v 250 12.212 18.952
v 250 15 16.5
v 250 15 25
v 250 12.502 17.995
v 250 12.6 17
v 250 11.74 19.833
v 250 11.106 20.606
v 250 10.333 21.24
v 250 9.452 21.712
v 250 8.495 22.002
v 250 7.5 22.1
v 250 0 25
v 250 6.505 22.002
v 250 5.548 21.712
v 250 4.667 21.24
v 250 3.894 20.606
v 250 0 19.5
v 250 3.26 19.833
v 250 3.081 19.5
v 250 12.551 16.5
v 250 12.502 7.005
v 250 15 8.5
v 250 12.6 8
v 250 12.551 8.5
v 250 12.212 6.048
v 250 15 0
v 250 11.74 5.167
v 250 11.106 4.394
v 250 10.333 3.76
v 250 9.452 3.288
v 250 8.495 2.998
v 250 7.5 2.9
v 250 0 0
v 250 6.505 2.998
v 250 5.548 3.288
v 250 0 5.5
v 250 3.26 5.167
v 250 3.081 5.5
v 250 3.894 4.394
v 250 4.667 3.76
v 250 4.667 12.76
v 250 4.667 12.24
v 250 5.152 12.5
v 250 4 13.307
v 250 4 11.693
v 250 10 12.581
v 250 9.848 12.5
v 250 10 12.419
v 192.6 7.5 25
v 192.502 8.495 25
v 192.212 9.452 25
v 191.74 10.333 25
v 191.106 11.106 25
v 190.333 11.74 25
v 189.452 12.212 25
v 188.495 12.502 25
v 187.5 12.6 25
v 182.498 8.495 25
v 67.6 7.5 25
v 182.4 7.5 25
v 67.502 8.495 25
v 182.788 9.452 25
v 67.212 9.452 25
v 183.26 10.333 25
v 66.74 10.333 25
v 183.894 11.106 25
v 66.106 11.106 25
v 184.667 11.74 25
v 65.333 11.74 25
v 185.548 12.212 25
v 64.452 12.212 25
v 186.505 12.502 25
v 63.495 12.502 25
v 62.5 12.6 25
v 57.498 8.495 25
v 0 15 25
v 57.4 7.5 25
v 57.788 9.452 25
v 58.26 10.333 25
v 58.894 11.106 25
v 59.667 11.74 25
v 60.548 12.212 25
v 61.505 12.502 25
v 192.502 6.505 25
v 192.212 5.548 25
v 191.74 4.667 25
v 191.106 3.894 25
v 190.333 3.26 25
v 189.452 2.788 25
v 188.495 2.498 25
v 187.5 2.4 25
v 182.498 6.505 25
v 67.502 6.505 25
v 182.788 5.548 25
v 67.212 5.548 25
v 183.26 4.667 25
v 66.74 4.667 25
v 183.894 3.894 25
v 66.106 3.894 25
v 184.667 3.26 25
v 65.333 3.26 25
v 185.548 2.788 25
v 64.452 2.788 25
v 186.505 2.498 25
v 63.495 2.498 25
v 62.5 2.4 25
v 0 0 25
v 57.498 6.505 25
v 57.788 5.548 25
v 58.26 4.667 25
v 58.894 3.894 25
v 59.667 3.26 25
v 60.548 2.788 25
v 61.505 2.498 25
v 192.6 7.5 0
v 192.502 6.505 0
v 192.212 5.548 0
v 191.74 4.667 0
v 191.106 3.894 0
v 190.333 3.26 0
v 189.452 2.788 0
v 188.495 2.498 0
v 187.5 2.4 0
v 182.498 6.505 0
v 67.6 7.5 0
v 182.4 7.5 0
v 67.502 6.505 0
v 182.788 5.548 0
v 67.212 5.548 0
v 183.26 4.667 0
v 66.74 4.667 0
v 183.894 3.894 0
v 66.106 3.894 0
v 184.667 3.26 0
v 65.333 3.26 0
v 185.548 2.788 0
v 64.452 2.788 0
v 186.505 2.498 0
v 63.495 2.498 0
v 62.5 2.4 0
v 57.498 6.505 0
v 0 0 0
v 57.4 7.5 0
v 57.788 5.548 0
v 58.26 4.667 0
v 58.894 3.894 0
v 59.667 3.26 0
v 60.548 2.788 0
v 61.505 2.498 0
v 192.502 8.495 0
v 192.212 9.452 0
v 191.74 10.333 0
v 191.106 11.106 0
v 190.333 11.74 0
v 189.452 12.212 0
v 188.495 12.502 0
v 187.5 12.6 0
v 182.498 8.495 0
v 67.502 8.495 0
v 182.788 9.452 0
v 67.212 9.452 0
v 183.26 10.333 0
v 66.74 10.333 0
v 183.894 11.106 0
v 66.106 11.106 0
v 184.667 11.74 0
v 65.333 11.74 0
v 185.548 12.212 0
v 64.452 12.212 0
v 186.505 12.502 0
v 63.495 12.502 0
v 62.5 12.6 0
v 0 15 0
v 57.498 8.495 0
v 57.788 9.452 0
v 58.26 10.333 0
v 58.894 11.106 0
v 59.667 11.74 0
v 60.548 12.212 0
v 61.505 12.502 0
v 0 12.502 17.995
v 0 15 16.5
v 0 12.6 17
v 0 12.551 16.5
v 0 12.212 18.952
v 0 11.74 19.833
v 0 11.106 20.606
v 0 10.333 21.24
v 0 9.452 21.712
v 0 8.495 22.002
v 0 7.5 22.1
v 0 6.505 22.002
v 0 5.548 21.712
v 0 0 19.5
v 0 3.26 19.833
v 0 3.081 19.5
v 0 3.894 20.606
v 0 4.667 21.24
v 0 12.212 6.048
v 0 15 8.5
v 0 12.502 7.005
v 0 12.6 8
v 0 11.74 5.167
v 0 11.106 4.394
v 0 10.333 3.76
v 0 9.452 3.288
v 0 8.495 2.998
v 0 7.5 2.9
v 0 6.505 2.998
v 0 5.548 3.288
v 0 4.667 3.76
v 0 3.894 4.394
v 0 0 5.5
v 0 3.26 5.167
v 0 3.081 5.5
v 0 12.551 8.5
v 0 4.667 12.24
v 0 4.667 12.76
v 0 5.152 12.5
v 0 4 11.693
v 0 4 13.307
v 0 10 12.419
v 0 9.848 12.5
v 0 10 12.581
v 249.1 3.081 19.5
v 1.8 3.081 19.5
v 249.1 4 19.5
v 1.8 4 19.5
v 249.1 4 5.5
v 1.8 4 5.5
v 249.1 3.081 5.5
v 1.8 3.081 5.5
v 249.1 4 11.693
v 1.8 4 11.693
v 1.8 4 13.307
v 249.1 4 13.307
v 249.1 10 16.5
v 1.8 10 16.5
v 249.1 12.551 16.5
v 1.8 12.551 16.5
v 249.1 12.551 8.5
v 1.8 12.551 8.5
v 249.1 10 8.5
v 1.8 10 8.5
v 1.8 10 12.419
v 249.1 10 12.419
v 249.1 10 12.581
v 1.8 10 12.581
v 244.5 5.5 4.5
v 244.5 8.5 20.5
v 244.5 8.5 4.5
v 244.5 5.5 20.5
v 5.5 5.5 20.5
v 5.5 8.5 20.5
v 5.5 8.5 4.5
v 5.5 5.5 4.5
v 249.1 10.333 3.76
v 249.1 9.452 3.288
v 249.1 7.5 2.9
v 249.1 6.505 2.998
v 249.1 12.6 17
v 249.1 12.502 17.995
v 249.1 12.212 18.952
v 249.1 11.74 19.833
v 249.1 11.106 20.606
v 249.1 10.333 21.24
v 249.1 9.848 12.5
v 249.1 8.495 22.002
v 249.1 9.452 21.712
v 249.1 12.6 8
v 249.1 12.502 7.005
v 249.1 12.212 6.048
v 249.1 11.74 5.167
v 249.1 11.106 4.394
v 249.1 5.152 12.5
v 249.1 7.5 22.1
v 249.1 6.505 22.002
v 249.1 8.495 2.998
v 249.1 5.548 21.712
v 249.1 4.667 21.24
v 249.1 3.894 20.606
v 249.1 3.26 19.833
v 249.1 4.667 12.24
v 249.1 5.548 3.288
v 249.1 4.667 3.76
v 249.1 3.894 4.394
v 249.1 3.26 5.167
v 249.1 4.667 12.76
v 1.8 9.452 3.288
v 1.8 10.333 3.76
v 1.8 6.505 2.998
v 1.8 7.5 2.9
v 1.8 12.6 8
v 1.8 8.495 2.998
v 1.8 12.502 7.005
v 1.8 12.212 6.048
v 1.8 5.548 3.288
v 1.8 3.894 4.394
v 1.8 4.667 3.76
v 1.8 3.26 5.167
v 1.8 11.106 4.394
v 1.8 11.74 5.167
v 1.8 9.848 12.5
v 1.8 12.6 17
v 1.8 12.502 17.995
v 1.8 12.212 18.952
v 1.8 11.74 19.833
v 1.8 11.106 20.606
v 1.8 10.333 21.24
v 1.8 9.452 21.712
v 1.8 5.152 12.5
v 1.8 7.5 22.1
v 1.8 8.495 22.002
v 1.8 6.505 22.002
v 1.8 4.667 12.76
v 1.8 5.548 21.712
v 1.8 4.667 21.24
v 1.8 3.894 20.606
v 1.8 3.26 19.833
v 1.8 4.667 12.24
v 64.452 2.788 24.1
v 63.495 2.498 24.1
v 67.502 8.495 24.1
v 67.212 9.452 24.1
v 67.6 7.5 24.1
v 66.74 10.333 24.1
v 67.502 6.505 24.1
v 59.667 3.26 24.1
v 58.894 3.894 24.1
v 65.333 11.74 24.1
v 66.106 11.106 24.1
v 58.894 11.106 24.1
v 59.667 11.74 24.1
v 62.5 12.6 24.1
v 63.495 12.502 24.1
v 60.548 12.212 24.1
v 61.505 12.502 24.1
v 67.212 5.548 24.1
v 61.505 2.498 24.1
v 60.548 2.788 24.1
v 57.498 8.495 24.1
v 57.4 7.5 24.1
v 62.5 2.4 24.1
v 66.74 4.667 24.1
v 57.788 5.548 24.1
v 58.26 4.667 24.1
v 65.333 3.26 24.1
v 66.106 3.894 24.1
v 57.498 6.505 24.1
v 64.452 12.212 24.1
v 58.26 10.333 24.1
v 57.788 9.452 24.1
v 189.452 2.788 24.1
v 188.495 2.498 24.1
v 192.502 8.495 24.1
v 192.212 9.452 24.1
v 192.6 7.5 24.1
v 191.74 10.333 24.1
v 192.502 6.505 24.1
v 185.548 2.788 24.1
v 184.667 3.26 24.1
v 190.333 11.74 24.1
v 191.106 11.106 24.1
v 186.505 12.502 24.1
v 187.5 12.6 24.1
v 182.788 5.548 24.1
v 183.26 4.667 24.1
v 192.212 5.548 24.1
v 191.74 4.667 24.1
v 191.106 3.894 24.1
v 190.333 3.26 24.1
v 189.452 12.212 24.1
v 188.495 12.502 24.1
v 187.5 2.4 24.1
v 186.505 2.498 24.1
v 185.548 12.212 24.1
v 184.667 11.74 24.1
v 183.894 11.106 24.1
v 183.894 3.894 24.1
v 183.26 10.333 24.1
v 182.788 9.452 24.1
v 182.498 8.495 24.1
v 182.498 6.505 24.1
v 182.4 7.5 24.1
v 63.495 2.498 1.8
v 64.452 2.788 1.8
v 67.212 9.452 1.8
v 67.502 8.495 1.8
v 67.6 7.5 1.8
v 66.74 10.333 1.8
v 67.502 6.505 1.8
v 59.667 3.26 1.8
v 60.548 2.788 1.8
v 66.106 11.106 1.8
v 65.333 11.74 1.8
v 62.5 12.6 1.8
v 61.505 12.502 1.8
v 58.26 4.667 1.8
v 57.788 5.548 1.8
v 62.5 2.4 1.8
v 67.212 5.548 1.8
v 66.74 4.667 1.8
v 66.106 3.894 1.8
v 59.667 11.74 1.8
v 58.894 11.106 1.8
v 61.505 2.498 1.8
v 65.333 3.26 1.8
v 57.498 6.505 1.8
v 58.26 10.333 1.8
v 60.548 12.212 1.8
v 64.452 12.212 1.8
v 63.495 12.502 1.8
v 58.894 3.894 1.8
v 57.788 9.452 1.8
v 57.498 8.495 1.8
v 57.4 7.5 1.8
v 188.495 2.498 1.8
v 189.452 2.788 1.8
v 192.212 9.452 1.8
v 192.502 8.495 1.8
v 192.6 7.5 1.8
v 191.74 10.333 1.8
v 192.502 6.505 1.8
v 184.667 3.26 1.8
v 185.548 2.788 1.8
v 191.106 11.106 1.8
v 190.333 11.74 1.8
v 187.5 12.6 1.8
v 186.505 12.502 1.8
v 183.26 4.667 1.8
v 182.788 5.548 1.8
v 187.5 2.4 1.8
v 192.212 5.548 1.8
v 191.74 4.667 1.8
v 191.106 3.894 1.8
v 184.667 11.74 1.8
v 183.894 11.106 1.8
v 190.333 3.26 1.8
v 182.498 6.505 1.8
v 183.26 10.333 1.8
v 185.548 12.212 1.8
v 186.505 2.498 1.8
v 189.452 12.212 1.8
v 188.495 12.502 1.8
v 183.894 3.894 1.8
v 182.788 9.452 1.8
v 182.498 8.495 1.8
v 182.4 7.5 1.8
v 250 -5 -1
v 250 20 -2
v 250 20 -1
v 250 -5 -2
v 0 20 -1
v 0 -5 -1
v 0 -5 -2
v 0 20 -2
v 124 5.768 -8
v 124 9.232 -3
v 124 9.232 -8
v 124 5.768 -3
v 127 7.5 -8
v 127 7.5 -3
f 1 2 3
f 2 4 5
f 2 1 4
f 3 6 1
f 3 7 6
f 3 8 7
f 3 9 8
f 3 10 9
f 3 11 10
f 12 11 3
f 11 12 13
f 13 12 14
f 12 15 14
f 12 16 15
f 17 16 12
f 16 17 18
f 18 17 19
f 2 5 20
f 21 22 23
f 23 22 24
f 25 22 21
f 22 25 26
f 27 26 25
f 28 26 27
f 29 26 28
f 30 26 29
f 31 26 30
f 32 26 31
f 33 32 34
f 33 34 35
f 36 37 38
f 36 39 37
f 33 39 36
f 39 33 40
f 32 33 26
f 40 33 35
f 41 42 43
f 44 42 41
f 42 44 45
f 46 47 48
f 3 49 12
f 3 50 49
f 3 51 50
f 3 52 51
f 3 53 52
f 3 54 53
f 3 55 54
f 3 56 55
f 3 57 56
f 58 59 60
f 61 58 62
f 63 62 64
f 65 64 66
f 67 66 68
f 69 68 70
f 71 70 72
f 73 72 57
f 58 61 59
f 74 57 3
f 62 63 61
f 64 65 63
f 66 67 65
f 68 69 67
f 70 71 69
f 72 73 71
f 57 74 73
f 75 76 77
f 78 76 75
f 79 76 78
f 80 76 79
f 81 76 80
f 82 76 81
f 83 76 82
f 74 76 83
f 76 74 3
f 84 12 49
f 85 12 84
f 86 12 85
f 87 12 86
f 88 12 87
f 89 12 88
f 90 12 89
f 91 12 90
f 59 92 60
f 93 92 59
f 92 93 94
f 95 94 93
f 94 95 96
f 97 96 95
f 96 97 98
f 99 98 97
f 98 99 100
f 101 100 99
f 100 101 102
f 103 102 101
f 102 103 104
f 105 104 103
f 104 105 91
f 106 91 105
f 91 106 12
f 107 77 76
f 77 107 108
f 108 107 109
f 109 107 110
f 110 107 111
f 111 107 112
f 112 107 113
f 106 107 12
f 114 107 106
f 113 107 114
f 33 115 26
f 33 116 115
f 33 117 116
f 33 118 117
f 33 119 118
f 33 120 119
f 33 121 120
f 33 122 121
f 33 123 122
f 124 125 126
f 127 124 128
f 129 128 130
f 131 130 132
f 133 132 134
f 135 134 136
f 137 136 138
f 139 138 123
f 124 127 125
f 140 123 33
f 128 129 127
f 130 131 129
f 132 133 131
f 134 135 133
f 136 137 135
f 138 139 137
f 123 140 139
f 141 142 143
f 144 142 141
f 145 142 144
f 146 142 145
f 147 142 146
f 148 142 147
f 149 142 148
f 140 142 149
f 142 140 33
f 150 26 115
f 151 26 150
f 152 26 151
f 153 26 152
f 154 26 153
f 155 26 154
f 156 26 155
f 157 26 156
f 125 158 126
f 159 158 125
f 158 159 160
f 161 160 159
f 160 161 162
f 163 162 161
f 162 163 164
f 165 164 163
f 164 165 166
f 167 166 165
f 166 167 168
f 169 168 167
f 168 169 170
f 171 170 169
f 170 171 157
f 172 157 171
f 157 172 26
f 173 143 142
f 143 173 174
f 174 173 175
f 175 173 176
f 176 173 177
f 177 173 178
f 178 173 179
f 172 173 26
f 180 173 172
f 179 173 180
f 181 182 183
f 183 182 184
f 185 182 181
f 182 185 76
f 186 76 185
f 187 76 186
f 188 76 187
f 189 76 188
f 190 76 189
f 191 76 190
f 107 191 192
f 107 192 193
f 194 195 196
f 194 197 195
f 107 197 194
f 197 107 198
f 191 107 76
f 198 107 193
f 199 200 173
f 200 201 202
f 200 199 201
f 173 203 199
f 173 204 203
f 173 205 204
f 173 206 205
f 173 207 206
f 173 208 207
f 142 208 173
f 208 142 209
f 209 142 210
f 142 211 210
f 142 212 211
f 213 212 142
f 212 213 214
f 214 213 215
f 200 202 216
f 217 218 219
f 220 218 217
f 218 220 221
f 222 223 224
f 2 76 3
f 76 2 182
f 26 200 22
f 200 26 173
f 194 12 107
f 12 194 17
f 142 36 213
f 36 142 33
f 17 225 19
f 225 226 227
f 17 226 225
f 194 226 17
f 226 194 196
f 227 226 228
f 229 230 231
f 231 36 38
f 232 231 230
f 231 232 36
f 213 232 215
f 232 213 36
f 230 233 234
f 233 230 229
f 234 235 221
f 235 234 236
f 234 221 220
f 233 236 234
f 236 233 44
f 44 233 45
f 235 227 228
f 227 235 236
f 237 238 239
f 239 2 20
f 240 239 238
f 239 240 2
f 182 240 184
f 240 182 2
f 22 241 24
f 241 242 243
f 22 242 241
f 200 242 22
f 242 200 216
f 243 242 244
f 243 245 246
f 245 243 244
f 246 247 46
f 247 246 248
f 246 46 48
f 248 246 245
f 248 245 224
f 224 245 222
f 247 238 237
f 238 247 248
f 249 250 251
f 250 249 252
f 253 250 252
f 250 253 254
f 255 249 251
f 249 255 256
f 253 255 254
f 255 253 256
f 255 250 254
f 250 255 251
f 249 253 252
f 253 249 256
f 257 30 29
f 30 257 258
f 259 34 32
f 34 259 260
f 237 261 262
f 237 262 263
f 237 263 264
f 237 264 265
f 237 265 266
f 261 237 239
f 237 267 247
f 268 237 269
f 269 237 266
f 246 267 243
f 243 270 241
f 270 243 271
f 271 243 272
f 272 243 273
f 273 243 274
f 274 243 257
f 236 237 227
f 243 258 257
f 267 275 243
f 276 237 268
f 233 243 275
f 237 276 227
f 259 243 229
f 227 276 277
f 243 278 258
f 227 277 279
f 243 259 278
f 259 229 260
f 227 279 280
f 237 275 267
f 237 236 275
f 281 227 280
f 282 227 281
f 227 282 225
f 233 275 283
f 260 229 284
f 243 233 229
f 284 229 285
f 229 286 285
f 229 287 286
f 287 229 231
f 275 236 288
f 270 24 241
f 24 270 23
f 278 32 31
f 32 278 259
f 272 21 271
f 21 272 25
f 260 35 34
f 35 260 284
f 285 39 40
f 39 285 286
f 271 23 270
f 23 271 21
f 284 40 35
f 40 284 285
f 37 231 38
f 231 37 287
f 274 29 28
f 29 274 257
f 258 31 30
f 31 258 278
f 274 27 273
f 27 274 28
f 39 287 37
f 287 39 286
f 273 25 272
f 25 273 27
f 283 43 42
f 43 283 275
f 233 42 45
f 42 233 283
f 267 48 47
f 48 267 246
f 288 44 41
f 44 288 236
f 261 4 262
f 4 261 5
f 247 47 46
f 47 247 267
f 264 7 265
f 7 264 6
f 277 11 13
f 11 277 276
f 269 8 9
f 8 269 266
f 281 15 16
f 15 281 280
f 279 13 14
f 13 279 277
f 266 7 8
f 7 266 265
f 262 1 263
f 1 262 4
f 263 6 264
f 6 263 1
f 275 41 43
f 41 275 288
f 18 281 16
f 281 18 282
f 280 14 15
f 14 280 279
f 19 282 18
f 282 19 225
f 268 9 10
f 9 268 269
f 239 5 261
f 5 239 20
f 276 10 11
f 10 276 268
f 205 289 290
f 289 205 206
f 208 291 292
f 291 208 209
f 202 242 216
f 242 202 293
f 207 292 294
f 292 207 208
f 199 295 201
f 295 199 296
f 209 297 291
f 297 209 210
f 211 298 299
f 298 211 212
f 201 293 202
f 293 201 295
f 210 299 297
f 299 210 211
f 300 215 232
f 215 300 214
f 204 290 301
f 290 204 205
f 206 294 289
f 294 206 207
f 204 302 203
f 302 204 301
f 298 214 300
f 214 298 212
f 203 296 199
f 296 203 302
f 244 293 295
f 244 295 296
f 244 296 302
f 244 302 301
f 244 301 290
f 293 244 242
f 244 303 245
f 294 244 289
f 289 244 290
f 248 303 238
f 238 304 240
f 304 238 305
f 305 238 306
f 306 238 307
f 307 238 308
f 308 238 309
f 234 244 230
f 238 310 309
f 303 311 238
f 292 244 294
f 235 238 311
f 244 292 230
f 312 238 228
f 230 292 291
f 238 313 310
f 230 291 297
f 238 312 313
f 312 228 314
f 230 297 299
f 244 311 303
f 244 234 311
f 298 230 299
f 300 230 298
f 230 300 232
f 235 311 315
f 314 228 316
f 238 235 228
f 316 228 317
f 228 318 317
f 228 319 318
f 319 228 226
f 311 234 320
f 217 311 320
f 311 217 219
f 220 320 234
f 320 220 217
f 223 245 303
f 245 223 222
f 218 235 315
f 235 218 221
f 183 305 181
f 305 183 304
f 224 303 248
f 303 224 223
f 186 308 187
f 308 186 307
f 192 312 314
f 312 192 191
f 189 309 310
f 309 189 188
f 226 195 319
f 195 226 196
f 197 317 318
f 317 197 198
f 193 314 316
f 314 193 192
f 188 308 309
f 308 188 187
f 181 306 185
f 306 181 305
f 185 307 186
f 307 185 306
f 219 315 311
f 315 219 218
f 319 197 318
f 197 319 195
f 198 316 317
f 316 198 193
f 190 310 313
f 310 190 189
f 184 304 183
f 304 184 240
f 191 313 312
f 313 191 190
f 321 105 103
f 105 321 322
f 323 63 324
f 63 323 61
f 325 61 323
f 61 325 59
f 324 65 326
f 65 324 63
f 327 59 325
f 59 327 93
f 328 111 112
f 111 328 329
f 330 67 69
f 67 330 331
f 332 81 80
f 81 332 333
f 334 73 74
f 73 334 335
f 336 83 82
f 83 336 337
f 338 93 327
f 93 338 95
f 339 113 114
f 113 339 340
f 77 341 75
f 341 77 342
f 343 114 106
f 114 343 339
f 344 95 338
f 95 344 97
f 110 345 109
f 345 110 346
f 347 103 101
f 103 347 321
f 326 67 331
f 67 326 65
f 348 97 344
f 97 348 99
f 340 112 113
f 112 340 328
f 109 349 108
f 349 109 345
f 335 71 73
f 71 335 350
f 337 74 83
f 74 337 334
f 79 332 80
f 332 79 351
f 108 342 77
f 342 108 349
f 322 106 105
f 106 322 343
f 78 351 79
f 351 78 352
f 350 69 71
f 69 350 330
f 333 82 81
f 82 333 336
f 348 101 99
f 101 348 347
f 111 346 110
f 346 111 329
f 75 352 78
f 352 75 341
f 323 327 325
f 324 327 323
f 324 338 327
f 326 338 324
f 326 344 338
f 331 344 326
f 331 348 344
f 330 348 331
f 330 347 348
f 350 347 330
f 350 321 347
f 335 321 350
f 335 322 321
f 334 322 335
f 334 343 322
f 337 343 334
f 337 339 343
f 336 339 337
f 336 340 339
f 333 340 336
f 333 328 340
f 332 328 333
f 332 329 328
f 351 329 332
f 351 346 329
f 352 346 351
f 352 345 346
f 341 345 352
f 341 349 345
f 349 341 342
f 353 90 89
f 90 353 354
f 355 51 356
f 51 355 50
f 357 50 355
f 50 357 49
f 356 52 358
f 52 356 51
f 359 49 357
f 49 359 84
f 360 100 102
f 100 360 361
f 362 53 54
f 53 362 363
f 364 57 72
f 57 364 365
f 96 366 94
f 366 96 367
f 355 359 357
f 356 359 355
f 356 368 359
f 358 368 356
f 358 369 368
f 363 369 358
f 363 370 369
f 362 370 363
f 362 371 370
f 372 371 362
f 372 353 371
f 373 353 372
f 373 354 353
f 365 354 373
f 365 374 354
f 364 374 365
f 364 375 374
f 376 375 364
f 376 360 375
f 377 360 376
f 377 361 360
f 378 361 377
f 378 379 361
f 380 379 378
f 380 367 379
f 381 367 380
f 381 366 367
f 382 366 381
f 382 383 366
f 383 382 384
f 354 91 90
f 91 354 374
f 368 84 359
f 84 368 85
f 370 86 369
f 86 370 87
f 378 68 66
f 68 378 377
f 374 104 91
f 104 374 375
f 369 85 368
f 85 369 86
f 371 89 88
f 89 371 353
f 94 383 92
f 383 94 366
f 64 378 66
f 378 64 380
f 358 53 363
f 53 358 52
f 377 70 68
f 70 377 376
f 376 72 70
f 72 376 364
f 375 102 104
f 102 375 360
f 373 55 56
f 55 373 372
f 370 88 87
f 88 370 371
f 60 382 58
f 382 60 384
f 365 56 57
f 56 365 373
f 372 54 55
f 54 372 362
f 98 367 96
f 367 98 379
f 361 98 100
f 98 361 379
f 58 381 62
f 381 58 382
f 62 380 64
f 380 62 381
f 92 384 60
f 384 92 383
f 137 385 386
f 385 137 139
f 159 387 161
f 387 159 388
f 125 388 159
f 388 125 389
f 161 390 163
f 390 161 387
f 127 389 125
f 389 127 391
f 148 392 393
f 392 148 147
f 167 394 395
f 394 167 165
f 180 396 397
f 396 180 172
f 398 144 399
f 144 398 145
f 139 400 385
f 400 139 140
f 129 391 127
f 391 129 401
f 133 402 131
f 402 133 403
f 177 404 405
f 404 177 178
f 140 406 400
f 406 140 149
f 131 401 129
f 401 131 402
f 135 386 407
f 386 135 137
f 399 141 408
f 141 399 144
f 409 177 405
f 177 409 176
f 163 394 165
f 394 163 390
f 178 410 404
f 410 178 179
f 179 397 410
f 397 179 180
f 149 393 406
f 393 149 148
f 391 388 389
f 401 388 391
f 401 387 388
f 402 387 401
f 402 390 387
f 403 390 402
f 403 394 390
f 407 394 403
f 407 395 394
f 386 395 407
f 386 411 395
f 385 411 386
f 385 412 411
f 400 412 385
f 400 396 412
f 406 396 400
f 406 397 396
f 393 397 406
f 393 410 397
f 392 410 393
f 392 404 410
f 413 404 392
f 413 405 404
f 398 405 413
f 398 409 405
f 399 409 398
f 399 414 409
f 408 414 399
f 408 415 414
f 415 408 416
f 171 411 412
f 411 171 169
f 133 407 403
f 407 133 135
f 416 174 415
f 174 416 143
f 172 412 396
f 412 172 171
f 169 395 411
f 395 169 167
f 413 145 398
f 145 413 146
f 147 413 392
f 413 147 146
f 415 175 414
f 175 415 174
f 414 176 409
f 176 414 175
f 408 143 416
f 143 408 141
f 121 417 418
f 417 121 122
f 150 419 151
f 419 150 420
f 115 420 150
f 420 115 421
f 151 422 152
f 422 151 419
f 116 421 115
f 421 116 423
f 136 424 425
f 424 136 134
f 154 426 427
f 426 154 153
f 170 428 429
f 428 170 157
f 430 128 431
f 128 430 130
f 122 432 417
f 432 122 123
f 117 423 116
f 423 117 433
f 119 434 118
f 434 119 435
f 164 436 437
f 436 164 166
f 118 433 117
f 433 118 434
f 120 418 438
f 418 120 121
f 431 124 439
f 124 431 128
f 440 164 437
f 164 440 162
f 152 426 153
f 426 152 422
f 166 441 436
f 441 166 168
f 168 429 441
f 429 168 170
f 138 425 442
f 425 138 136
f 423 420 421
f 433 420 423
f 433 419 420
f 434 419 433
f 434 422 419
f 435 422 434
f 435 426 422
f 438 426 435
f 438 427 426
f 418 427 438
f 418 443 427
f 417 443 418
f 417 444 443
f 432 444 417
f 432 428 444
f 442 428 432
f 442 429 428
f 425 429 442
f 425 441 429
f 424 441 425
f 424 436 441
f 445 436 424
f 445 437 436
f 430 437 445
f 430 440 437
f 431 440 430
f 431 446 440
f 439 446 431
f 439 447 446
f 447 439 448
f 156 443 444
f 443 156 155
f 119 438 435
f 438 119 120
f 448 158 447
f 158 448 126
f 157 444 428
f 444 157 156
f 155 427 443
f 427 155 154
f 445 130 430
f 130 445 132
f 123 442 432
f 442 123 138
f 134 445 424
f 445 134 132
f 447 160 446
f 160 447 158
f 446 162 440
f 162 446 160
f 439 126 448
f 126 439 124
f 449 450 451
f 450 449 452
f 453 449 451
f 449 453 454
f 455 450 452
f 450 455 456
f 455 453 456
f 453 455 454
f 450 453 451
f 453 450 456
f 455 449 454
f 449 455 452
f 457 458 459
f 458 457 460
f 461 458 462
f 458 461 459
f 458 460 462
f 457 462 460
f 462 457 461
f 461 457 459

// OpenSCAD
// file: single_module.scad
/*
 * Single LED Strip Module - Minimal Design
 * Compact holder for one section of WS2812B LED strip
 *
 * Features:
 * - Minimal size - just enough to hold the strip
 * - 4 magnet holes for modular connections
 * - Lightweight and movable
 */

// ========== CONFIGURATION ==========

// LED Strip dimensions
strip_segment_length = 250;  // Length of this module
strip_width = 12;            // WS2812B strip width

// Module dimensions (MINIMIZED)
module_width = strip_segment_length;
module_height = 25;          // 2.5cm vertical spacing (compact!)
module_depth = 15;           // Reduced from 20mm to 15mm
wall_thickness = 1.5;        // Reduced from 2mm to 1.5mm

// LED channel (on front)
led_channel_depth = 4;       // Shallow groove (reduced from 5mm)
led_channel_width = 14;      // Increased to 14mm for better fit

// Wire channel (on back)
wire_channel_width = 8;      // Narrow channel for wires
wire_channel_depth = 5;      // Back routing space

// Magnets (user's magnets: 10mm dia × 1.54mm thick)
magnet_dia = 10.2;           // 10mm + 0.2mm tolerance
magnet_thickness = 1.8;      // 1.54mm + tolerance (thin!)
magnet_inset = 8;            // Distance from edges (adjusted for 25mm height)

// ========== SINGLE MODULE ==========

module minimal_strip_holder() {
    difference() {
        // Main body - thin shell
        cube([module_width, module_depth, module_height]);

        // Front LED channel (OPEN ENDS - strip passes through)
        translate([-0.1, -0.1, module_height/2 - led_channel_width/2])
            cube([module_width + 0.2,  // Goes all the way through left to right
                  led_channel_depth + 0.1,
                  led_channel_width]);

        // Back wire channel (OPEN ENDS - wires pass through)
        translate([-0.1, module_depth - wire_channel_depth, module_height/2 - wire_channel_width/2])
            cube([module_width + 0.2,  // Goes all the way through left to right
                  wire_channel_depth + 0.1,
                  wire_channel_width]);

        // Center cavity (weight reduction)
        translate([wall_thickness + 4,
                  led_channel_depth + wall_thickness,
                  wall_thickness + 3])
            cube([module_width - 2*wall_thickness - 8,
                  module_depth - led_channel_depth - wire_channel_depth - 2*wall_thickness,
                  module_height - 2*wall_thickness - 6]);

        // HORIZONTAL magnets (left/right)
        // Right side
        translate([module_width - magnet_thickness/2, module_depth/2, magnet_inset])
            rotate([0, 90, 0])
            cylinder(h=magnet_thickness + 0.1, d=magnet_dia, $fn=32);
        translate([module_width - magnet_thickness/2, module_depth/2, module_height - magnet_inset])
            rotate([0, 90, 0])
            cylinder(h=magnet_thickness + 0.1, d=magnet_dia, $fn=32);

        // Left side
        translate([-0.1, module_depth/2, magnet_inset])
            rotate([0, 90, 0])
            cylinder(h=magnet_thickness + 0.1, d=magnet_dia, $fn=32);
        translate([-0.1, module_depth/2, module_height - magnet_inset])
            rotate([0, 90, 0])
            cylinder(h=magnet_thickness + 0.1, d=magnet_dia, $fn=32);

        // VERTICAL magnets (top/bottom)
        // Top
        translate([module_width/4, module_depth/2, module_height - magnet_thickness/2])
            cylinder(h=magnet_thickness + 0.1, d=magnet_dia, $fn=32);
        translate([3*module_width/4, module_depth/2, module_height - magnet_thickness/2])
            cylinder(h=magnet_thickness + 0.1, d=magnet_dia, $fn=32);

        // Bottom
        translate([module_width/4, module_depth/2, -0.1])
            cylinder(h=magnet_thickness + 0.1, d=magnet_dia, $fn=32);
        translate([3*module_width/4, module_depth/2, -0.1])
            cylinder(h=magnet_thickness + 0.1, d=magnet_dia, $fn=32);
    }
}

// LED strip visualization (optional)
module led_strip_visual() {
    color("white", 0.9)
    translate([wall_thickness, led_channel_depth - 3, module_height/2 - strip_width/2])
    rotate([90, 0, 0])
    cube([module_width - 2*wall_thickness, strip_width, 3]);

    // LEDs
    led_spacing = module_width / 36;  // 36 LEDs per module
    for (i = [0:35]) {
        color("gold", 0.8)
        translate([i * led_spacing + led_spacing/2,
                  1,
                  module_height/2])
            rotate([90, 0, 0])
            cylinder(h=2, d=4, $fn=6);
    }
}

// ========== RENDER ==========

// Show module
minimal_strip_holder();

// Show LED strip (uncomment to visualize)
// led_strip_visual();

// ========== EXPORT NOTES ==========
/*
 * DIMENSIONS:
 * - Size: 250mm (W) × 50mm (H) × 15mm (D)
 * - Weight: ~15-18g per module (at 15% infill)
 * - Wall thickness: 1.5mm
 *
 * MAGNETS:
 * - 4× 10mm × 3mm neodymium magnets per module
 * - Amazon: "neodymium magnets 10mm x 3mm N52"
 *
 * PRINTING:
 * - Layer height: 0.2mm
 * - Infill: 15%
 * - No supports needed
 * - Print time: ~1-1.5 hours per module
 *
 * CUSTOMIZATION:
 * - Adjust module_width for different lengths (e.g., 200mm, 333mm)
 * - Change module_height for different spacing (e.g., 30mm, 40mm, 60mm)
 * - Modify led_channel_width if your strip is wider/narrower
 *
 * EXPORT STL:
 * openscad -o module.stl single_module.scad
 */
// main file
use <single_module.scad>

// GOOD orientation - narrow side down
minimal_strip_holder();

// Show build plate underneath
translate([0, -5, -2])
    color("lightblue", 0.5)
    cube([250, 25, 1]);

// Arrow showing "this face down"
translate([125, 7.5, -8])
    color("green")
    cylinder(h=5, r=2, $fn=3);
